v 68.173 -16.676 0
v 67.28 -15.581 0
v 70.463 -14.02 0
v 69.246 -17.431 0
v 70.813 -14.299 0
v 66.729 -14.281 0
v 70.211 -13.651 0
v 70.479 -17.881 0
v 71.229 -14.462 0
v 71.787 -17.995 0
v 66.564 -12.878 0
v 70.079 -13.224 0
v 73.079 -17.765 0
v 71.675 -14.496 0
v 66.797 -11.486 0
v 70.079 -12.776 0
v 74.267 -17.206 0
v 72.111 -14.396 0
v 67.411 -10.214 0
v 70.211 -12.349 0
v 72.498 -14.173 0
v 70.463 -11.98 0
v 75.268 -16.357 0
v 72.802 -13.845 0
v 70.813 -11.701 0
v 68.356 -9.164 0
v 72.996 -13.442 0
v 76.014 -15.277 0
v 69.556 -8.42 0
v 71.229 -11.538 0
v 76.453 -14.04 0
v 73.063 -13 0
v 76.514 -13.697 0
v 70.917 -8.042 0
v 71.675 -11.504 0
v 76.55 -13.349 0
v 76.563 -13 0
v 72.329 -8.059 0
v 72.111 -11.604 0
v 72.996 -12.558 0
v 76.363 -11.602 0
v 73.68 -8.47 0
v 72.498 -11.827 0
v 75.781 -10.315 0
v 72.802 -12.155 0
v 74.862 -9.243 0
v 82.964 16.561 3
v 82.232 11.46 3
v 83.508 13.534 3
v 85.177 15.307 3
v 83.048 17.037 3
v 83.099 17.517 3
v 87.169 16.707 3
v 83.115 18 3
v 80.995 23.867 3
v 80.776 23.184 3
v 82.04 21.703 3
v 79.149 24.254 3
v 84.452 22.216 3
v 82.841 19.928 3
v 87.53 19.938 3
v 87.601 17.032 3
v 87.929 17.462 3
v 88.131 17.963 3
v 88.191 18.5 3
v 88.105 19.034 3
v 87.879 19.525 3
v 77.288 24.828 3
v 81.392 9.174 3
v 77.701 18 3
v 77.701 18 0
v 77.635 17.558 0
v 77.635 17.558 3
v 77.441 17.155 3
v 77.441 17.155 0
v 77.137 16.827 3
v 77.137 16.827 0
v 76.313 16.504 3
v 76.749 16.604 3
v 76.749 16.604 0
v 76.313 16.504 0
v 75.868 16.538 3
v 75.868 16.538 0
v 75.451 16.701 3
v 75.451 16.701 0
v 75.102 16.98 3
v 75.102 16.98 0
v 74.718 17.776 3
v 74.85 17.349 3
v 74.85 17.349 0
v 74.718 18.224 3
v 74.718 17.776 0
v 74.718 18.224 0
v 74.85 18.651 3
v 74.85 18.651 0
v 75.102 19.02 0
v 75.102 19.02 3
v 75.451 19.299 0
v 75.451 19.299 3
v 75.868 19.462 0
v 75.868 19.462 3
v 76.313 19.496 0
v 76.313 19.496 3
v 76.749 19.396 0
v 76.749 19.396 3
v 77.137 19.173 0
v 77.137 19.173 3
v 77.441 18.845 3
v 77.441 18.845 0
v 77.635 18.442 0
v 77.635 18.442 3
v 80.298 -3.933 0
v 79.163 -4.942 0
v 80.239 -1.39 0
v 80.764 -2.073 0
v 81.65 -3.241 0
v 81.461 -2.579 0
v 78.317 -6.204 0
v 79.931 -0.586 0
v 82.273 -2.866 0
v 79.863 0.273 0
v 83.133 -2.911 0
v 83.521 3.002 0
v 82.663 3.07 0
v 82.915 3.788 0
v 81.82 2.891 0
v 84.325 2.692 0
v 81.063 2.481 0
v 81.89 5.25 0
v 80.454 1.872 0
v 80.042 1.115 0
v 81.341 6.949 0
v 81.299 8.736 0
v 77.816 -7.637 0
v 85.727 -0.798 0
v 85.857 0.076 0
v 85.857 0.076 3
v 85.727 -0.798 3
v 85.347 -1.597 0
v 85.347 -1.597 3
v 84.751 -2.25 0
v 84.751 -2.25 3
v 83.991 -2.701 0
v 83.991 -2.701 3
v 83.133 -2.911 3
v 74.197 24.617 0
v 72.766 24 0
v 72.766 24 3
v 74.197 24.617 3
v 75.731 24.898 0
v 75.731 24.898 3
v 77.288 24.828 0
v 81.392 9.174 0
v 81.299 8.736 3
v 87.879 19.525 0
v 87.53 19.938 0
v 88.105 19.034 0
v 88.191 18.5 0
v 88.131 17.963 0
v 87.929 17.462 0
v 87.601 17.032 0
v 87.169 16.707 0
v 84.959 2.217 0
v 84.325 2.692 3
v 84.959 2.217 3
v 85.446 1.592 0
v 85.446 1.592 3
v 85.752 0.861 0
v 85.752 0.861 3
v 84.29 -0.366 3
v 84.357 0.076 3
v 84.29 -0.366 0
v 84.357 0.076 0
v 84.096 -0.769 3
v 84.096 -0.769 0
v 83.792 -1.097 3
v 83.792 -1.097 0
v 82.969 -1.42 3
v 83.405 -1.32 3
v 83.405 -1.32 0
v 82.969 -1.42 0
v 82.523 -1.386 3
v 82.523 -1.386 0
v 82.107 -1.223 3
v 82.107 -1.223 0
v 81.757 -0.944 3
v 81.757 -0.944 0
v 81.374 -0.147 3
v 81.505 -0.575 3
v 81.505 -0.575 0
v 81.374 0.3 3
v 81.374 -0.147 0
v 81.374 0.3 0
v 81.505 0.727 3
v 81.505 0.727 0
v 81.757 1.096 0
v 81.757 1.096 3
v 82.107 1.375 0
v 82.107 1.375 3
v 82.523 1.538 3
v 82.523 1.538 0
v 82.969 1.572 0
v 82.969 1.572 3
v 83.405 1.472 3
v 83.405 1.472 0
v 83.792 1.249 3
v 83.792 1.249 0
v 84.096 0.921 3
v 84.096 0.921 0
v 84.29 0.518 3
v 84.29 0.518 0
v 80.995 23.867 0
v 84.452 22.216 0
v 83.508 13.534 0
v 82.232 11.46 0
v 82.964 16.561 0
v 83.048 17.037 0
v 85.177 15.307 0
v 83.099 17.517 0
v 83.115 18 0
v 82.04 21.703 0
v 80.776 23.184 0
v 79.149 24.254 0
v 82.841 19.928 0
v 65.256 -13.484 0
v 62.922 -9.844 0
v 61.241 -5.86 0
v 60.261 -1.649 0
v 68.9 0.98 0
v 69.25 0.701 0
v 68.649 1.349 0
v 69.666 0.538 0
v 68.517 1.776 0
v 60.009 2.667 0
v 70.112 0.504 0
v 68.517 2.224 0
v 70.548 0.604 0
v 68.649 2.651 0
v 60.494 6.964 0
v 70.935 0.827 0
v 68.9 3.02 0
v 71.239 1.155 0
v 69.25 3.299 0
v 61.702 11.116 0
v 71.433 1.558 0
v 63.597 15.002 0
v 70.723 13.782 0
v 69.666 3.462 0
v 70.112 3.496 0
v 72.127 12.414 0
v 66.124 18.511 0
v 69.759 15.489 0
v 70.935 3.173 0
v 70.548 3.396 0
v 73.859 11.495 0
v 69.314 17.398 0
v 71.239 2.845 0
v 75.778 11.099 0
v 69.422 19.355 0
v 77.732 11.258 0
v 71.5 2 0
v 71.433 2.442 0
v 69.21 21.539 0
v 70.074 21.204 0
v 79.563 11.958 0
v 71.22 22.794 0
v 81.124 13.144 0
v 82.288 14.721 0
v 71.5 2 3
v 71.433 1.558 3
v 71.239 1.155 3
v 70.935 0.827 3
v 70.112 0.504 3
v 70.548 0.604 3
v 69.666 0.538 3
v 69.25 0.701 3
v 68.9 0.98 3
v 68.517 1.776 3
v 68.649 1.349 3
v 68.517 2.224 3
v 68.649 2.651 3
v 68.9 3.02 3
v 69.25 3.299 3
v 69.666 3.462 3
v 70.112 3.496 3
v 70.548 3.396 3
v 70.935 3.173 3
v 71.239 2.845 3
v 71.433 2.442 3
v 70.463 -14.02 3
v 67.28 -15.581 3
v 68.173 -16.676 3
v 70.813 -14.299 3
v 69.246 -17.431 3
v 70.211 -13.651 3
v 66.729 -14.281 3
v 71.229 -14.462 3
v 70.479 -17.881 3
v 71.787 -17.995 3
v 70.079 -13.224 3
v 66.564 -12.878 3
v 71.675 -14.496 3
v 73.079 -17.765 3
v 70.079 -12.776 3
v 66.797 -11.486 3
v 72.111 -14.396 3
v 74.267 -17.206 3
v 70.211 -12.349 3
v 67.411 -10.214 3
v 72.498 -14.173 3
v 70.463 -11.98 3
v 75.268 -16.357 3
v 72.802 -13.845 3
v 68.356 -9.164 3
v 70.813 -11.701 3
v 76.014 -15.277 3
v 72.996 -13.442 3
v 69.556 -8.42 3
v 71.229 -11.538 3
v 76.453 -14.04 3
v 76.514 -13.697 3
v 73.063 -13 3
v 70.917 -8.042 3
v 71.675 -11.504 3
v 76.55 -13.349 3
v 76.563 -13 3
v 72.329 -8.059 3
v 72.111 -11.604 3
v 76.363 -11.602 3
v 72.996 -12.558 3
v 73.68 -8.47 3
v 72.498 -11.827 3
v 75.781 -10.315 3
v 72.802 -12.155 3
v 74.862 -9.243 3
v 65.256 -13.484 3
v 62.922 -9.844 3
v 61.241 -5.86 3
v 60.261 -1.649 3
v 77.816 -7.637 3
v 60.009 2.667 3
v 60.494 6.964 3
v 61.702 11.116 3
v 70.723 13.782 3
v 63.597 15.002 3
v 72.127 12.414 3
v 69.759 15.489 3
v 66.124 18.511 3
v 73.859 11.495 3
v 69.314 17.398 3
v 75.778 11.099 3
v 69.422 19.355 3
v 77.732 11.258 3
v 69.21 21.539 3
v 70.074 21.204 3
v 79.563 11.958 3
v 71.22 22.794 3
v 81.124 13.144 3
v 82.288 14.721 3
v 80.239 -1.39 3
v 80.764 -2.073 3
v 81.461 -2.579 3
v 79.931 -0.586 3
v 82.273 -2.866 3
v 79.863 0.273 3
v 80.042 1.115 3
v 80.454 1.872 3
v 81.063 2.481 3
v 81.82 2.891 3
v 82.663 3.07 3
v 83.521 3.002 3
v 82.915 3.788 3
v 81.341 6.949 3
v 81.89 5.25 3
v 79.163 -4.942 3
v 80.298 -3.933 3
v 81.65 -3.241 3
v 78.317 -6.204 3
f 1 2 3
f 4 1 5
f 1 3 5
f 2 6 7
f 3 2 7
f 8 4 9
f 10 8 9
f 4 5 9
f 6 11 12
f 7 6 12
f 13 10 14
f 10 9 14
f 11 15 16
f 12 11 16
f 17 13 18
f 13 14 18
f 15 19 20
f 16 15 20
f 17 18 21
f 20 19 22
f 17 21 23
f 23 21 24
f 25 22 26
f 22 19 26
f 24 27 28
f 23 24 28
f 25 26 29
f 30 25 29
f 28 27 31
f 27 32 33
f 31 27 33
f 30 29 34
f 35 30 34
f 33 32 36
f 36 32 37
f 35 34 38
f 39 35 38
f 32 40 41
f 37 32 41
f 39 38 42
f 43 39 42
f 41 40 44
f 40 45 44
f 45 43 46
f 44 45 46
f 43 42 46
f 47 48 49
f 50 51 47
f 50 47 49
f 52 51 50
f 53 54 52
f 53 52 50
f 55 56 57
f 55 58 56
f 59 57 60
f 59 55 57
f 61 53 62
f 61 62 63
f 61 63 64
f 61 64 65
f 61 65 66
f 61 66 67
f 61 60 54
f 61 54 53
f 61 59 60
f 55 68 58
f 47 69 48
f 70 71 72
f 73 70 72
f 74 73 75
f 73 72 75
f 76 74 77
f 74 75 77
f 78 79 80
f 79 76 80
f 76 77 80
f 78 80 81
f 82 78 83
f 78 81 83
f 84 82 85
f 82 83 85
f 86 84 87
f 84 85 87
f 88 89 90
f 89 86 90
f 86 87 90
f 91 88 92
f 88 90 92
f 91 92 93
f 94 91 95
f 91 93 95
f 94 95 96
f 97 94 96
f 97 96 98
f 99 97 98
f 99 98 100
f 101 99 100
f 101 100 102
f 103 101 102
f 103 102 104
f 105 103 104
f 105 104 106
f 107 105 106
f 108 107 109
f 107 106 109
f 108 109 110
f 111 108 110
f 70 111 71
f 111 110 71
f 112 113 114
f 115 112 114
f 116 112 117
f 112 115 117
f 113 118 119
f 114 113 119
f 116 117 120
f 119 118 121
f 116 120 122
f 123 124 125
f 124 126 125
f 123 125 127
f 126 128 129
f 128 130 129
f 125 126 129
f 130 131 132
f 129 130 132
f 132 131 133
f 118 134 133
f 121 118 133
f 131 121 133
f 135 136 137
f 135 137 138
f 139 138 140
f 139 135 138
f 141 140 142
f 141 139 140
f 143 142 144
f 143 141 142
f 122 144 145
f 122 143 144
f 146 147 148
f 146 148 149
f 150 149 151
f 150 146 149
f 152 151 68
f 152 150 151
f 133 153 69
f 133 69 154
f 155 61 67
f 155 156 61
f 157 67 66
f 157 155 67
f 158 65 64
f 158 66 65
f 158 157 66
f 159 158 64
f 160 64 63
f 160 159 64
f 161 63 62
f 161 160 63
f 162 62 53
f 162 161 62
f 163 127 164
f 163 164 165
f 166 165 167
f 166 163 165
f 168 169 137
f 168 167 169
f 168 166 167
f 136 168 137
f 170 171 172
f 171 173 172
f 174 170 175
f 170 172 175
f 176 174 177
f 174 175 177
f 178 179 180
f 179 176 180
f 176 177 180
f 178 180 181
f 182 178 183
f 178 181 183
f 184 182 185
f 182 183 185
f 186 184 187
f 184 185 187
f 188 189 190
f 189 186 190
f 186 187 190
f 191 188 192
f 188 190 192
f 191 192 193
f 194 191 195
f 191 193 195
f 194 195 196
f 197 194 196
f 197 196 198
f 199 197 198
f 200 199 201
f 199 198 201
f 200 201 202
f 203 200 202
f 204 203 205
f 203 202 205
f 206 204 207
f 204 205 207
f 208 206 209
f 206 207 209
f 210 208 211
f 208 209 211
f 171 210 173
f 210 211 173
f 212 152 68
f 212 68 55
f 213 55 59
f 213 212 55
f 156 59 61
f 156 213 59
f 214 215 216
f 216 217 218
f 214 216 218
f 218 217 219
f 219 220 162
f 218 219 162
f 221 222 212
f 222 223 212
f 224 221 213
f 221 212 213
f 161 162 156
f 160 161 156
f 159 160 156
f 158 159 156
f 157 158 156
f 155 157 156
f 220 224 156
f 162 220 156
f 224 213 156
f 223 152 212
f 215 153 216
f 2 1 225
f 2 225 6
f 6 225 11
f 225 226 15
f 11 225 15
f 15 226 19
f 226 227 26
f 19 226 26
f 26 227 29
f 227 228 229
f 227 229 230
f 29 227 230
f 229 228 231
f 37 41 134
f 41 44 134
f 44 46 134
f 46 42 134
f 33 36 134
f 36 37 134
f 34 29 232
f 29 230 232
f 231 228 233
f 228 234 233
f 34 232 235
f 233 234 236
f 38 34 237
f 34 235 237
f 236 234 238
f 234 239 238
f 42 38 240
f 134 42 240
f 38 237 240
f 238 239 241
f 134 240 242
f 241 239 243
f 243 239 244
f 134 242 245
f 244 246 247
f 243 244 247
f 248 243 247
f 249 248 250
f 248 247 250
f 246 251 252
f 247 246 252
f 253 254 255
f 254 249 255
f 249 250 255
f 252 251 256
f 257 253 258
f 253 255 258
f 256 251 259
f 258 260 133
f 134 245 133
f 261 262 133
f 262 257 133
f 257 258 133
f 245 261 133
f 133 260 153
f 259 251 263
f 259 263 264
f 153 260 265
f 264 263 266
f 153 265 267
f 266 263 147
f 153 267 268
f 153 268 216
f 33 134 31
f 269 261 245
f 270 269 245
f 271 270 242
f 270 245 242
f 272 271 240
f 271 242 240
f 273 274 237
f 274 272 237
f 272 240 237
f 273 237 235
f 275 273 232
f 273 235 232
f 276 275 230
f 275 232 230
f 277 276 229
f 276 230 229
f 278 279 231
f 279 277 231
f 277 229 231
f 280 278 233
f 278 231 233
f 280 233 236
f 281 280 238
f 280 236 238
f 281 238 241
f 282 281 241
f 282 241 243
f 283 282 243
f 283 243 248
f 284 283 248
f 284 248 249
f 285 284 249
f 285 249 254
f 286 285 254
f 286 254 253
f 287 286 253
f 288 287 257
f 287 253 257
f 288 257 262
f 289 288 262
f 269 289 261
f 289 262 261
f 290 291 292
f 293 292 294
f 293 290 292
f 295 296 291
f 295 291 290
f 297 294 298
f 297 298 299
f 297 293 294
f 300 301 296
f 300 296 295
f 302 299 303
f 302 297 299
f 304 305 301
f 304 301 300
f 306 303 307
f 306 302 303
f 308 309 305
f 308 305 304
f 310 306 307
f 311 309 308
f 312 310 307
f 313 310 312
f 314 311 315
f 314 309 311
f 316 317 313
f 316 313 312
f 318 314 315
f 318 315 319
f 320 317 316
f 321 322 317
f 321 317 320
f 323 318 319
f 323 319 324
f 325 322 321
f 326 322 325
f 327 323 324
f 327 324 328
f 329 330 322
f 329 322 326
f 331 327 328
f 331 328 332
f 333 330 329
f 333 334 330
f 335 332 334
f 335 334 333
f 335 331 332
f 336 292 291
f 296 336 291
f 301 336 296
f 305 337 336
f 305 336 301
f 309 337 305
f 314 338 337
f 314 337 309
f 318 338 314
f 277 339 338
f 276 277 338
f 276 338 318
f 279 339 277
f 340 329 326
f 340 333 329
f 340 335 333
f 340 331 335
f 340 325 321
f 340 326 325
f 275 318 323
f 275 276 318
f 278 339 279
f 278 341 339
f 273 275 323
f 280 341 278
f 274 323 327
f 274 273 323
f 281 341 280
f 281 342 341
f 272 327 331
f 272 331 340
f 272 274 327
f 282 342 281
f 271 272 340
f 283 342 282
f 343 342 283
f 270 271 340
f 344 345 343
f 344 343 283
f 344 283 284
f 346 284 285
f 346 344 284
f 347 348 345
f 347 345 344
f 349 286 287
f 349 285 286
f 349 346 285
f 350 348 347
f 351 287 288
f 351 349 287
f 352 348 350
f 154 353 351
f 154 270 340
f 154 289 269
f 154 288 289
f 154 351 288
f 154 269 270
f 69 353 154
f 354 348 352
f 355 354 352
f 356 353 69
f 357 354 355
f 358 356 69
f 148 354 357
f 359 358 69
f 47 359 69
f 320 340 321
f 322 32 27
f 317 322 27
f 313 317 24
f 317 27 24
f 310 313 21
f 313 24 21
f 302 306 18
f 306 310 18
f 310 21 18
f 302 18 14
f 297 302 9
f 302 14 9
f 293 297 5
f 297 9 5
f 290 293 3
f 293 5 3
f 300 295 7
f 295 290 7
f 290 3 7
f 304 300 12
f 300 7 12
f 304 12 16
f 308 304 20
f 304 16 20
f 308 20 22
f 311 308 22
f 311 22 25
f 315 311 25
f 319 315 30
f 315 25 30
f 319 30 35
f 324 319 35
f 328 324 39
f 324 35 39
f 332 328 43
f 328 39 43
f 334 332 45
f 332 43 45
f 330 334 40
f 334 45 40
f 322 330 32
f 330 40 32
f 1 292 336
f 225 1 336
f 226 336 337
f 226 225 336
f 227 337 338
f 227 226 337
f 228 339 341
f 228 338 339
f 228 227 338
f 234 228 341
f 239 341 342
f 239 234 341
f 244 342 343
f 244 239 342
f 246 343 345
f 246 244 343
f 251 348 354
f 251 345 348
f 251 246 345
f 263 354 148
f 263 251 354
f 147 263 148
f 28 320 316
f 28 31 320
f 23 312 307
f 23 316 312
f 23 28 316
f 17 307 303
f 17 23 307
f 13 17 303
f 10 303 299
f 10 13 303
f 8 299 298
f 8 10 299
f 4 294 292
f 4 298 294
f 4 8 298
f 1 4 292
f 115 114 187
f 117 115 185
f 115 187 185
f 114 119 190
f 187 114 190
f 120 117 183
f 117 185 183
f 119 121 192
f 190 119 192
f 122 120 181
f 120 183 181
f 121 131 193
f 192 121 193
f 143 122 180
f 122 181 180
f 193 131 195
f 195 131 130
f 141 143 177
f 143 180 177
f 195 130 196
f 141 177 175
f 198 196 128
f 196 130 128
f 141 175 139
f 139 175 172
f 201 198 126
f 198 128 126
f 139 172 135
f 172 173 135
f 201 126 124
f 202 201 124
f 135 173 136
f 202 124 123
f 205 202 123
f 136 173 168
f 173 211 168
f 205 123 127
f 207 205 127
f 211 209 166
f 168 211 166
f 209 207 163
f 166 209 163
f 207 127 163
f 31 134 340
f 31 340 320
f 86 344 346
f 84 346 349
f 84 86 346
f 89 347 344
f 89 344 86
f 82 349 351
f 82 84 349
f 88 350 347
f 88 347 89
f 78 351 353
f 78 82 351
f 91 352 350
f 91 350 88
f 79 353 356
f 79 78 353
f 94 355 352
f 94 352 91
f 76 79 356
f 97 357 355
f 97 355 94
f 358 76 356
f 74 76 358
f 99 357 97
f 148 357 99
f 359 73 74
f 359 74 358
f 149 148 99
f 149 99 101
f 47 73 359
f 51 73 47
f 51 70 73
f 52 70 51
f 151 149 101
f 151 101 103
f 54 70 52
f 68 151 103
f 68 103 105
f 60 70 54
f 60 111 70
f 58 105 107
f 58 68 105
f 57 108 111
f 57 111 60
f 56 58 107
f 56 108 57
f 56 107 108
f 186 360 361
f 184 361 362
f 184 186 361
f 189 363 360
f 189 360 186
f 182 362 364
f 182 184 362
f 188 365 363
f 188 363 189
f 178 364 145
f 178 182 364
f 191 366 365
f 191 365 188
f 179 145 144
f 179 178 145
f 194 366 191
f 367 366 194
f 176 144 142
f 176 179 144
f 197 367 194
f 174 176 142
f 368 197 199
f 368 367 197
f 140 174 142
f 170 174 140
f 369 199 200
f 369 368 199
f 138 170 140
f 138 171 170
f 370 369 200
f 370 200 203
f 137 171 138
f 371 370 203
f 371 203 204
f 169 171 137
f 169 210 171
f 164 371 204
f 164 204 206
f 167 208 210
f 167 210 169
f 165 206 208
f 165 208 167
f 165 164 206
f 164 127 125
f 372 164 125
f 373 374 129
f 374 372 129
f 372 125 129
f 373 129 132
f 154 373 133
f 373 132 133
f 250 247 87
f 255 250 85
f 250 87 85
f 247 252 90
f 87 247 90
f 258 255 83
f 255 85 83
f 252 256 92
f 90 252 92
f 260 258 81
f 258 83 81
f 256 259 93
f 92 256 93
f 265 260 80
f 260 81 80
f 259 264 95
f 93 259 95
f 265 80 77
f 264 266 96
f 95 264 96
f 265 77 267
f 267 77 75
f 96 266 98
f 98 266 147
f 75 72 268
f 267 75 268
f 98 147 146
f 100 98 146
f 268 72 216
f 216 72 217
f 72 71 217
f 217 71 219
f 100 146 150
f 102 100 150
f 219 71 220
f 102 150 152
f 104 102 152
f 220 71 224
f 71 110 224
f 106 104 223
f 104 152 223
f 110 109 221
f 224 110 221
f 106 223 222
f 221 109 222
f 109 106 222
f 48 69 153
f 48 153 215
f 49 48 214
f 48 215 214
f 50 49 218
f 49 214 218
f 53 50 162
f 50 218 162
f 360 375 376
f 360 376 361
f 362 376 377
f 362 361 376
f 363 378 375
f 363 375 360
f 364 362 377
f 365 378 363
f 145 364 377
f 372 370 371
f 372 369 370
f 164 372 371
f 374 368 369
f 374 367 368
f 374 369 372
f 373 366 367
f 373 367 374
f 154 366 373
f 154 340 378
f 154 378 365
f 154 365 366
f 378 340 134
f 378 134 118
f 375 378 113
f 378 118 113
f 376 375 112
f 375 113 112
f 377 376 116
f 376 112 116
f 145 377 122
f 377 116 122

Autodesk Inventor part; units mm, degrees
ref_plane "YZ Plane" through (0, 0, 0) normal (1, 0, 0) x (0, 1, 0)
ref_plane "XZ Plane" through (0, 0, 0) normal (0, 1, 0) x (-1, 0, 0)
ref_plane "XY Plane" through (0, 0, 0) normal (0, 0, 1) x (1, 0, 0)
sketch "スケッチ1" plane through (0, 0, 0) normal (0, 0, 1) x (1, 0, 0)
  circle A0 centre (76.2014, 18) radius 1.25
  circle A1 centre (70, 2) radius 1.5
  circle A2 centre (71.5626, -13) radius 1.25
  circle A3 centre (71.5626, -13) radius 5
  arc A4 (72.7656, 23.9999) -> (68.1729, -16.6757) centre (85.3759, 1.979) ccw
  circle A5 centre (139.7986, 18) radius 1.25
  circle A6 centre (139.7986, 18) radius 6.914
  arc A7 (147.8271, -16.6757) -> (143.2344, 23.9999) centre (130.6241, 1.979) ccw
  circle A8 centre (146, 2) radius 1.5
  circle A9 centre (144.4374, -13) radius 5
  circle A10 centre (144.4374, -13) radius 1.25
  circle A11 centre (76.2014, 18) radius 6.914
  line L0 (82.9641, 16.5612) -> (76.4531, -14.0405)
  line L1 (133.0359, 16.5612) -> (139.5469, -14.0405)
  arc A12 (87.1691, 16.7068) -> (81.2992, 8.7363) centre (93.0365, 6.239) ccw
  arc A13 (87.1691, 16.7068) -> (87.5297, 19.9375) centre (86.1912, 18.4514) ccw
  arc A14 (87.5297, 19.9375) -> (77.288, 24.8281) centre (74.1449, 5.0766) ccw
  line L2 (108, 72.8318) -> (108, -27.6373) construction
  arc A15 (134.7008, 8.7363) -> (128.8309, 16.7068) centre (122.9635, 6.239) ccw
  arc A16 (138.712, 24.8281) -> (128.4703, 19.9375) centre (141.8551, 5.0766) ccw
  arc A17 (128.4703, 19.9375) -> (128.8309, 16.7068) centre (129.8088, 18.4514) ccw
  circle A18 centre (82.8568, 0.0761) radius 1.5
  circle A19 centre (133.1432, 0.0761) radius 1.75
  circle A20 centre (82.8568, 0.0761) radius 3
  arc A21 (81.3922, 9.1736) -> (84.3249, 2.6924) centre (87.2609, 7.9249) ccw
  arc A22 (83.1326, -2.9112) -> (77.8155, -7.6372) centre (83.6841, -8.8858) ccw
  arc A23 (131.6751, 2.6924) -> (134.6078, 9.1736) centre (128.7391, 7.9249) ccw
  circle A24 centre (133.1432, 0.0761) radius 3
  arc A25 (138.1845, -7.6372) -> (132.8674, -2.9112) centre (132.3159, -8.8858) ccw
  circle A26 centre (76.2014, 18) radius 1.5
  circle A27 centre (71.5626, -13) radius 1.5
  point P0 (0, 0)
  point P1 (0, 0)
  point P2 (81.3565, 8.9919)
  dimension "d0" = 8
  dimension "d1" = 2
  dimension "d2" = 12
  dimension "d3" = 20
  dimension "d4" = 10
  dimension "d5" = 6
  dimension "d6" = 6
  dimension "d7" = 6
  dimension "d10" = 2.5
  dimension "d11" = 3
  dimension "d12" = 3
  dimension "d13" = 3
  dimension "d14" = 3
extrude "押し出し1" add sketch "スケッチ1" along normal blind 3 contours A3 | A3 A4 A11 L0 | A11 | L0 A12 A21 A20 A22 | A14 A13 A12 A21 L0 A11 | A20
equation "\"d7\" = d6"
equation "\"d12\" = d11"
equation "\"d13\" = d11"
equation "\"d14\" = d11"
properties part number "アンノーン" material "アルミニウム 2014-T4"
